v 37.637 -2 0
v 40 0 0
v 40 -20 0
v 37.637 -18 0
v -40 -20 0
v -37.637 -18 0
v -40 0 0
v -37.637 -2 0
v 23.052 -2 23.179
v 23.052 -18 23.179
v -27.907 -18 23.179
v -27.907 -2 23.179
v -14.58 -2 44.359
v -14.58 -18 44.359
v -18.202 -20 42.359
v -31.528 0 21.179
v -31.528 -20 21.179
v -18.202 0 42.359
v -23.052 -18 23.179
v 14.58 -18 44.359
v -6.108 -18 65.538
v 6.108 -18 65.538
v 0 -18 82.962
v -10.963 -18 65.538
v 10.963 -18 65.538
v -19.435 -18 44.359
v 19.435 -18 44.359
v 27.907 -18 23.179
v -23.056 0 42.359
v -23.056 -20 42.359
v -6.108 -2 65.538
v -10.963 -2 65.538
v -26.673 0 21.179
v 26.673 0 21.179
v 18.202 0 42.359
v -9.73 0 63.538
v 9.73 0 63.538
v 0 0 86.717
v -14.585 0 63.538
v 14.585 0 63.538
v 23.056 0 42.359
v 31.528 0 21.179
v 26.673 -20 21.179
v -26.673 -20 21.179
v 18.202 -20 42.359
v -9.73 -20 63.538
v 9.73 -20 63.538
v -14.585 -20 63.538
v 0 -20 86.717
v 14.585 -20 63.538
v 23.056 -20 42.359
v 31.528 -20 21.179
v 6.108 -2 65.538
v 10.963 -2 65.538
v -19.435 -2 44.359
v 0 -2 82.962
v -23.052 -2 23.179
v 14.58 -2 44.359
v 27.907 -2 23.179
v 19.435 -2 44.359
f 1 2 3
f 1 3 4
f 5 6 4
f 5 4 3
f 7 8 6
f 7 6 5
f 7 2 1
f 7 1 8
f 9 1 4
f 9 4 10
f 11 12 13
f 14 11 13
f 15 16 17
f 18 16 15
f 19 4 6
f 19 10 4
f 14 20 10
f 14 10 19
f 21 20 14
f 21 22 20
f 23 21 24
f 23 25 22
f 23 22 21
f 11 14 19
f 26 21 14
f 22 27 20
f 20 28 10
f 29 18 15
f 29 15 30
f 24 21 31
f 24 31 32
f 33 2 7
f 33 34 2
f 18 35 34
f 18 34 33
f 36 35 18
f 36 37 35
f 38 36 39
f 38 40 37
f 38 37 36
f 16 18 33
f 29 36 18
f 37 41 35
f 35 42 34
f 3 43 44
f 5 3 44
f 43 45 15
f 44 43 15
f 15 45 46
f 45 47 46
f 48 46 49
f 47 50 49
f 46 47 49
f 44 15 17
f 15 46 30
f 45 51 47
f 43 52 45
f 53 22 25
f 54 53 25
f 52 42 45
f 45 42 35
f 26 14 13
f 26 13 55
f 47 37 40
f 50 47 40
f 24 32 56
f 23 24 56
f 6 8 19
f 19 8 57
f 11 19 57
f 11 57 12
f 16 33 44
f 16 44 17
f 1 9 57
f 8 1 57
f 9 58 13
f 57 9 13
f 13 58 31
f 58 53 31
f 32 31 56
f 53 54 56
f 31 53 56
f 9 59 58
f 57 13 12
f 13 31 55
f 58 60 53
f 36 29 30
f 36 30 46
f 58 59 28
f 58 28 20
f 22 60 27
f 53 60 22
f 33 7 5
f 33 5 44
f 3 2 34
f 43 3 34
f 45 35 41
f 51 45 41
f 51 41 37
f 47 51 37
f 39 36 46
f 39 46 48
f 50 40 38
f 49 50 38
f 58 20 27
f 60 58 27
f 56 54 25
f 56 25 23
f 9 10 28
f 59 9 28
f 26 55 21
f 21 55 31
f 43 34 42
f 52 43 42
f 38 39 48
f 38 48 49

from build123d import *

# Parameters (mm, degrees)
F1_DEPTH = 20
F3_T     = -2


with BuildPart() as f1:
    # F0 (on Front) → F1 (new body)
    with BuildSketch(Plane.XZ):
        Polygon((0, 86.7171336596), (0, 0), (40, 0), (26.6733877361, 21.1794357747), (31.5282256901, 21.1794357747), (18.2016134262, 42.3588715494), (23.0564513803, 42.3588715494), (9.7298391163, 63.5383073241), (14.5846770704, 63.5383073241), align=None)
    extrude(amount=F1_DEPTH)

    # F2: F1 across plane


with BuildPart() as f1_1:
    add(f1.part)
    add(f1.part.mirror(Plane.YZ))

    # F3
    f3_openings = [f1_1.faces().sort_by_distance(p)[0] for p in [
        (0, -10, 0),
    ]]
    offset(amount=F3_T, openings=f3_openings, kind=Kind.INTERSECTION)


solid = f1_1.part
